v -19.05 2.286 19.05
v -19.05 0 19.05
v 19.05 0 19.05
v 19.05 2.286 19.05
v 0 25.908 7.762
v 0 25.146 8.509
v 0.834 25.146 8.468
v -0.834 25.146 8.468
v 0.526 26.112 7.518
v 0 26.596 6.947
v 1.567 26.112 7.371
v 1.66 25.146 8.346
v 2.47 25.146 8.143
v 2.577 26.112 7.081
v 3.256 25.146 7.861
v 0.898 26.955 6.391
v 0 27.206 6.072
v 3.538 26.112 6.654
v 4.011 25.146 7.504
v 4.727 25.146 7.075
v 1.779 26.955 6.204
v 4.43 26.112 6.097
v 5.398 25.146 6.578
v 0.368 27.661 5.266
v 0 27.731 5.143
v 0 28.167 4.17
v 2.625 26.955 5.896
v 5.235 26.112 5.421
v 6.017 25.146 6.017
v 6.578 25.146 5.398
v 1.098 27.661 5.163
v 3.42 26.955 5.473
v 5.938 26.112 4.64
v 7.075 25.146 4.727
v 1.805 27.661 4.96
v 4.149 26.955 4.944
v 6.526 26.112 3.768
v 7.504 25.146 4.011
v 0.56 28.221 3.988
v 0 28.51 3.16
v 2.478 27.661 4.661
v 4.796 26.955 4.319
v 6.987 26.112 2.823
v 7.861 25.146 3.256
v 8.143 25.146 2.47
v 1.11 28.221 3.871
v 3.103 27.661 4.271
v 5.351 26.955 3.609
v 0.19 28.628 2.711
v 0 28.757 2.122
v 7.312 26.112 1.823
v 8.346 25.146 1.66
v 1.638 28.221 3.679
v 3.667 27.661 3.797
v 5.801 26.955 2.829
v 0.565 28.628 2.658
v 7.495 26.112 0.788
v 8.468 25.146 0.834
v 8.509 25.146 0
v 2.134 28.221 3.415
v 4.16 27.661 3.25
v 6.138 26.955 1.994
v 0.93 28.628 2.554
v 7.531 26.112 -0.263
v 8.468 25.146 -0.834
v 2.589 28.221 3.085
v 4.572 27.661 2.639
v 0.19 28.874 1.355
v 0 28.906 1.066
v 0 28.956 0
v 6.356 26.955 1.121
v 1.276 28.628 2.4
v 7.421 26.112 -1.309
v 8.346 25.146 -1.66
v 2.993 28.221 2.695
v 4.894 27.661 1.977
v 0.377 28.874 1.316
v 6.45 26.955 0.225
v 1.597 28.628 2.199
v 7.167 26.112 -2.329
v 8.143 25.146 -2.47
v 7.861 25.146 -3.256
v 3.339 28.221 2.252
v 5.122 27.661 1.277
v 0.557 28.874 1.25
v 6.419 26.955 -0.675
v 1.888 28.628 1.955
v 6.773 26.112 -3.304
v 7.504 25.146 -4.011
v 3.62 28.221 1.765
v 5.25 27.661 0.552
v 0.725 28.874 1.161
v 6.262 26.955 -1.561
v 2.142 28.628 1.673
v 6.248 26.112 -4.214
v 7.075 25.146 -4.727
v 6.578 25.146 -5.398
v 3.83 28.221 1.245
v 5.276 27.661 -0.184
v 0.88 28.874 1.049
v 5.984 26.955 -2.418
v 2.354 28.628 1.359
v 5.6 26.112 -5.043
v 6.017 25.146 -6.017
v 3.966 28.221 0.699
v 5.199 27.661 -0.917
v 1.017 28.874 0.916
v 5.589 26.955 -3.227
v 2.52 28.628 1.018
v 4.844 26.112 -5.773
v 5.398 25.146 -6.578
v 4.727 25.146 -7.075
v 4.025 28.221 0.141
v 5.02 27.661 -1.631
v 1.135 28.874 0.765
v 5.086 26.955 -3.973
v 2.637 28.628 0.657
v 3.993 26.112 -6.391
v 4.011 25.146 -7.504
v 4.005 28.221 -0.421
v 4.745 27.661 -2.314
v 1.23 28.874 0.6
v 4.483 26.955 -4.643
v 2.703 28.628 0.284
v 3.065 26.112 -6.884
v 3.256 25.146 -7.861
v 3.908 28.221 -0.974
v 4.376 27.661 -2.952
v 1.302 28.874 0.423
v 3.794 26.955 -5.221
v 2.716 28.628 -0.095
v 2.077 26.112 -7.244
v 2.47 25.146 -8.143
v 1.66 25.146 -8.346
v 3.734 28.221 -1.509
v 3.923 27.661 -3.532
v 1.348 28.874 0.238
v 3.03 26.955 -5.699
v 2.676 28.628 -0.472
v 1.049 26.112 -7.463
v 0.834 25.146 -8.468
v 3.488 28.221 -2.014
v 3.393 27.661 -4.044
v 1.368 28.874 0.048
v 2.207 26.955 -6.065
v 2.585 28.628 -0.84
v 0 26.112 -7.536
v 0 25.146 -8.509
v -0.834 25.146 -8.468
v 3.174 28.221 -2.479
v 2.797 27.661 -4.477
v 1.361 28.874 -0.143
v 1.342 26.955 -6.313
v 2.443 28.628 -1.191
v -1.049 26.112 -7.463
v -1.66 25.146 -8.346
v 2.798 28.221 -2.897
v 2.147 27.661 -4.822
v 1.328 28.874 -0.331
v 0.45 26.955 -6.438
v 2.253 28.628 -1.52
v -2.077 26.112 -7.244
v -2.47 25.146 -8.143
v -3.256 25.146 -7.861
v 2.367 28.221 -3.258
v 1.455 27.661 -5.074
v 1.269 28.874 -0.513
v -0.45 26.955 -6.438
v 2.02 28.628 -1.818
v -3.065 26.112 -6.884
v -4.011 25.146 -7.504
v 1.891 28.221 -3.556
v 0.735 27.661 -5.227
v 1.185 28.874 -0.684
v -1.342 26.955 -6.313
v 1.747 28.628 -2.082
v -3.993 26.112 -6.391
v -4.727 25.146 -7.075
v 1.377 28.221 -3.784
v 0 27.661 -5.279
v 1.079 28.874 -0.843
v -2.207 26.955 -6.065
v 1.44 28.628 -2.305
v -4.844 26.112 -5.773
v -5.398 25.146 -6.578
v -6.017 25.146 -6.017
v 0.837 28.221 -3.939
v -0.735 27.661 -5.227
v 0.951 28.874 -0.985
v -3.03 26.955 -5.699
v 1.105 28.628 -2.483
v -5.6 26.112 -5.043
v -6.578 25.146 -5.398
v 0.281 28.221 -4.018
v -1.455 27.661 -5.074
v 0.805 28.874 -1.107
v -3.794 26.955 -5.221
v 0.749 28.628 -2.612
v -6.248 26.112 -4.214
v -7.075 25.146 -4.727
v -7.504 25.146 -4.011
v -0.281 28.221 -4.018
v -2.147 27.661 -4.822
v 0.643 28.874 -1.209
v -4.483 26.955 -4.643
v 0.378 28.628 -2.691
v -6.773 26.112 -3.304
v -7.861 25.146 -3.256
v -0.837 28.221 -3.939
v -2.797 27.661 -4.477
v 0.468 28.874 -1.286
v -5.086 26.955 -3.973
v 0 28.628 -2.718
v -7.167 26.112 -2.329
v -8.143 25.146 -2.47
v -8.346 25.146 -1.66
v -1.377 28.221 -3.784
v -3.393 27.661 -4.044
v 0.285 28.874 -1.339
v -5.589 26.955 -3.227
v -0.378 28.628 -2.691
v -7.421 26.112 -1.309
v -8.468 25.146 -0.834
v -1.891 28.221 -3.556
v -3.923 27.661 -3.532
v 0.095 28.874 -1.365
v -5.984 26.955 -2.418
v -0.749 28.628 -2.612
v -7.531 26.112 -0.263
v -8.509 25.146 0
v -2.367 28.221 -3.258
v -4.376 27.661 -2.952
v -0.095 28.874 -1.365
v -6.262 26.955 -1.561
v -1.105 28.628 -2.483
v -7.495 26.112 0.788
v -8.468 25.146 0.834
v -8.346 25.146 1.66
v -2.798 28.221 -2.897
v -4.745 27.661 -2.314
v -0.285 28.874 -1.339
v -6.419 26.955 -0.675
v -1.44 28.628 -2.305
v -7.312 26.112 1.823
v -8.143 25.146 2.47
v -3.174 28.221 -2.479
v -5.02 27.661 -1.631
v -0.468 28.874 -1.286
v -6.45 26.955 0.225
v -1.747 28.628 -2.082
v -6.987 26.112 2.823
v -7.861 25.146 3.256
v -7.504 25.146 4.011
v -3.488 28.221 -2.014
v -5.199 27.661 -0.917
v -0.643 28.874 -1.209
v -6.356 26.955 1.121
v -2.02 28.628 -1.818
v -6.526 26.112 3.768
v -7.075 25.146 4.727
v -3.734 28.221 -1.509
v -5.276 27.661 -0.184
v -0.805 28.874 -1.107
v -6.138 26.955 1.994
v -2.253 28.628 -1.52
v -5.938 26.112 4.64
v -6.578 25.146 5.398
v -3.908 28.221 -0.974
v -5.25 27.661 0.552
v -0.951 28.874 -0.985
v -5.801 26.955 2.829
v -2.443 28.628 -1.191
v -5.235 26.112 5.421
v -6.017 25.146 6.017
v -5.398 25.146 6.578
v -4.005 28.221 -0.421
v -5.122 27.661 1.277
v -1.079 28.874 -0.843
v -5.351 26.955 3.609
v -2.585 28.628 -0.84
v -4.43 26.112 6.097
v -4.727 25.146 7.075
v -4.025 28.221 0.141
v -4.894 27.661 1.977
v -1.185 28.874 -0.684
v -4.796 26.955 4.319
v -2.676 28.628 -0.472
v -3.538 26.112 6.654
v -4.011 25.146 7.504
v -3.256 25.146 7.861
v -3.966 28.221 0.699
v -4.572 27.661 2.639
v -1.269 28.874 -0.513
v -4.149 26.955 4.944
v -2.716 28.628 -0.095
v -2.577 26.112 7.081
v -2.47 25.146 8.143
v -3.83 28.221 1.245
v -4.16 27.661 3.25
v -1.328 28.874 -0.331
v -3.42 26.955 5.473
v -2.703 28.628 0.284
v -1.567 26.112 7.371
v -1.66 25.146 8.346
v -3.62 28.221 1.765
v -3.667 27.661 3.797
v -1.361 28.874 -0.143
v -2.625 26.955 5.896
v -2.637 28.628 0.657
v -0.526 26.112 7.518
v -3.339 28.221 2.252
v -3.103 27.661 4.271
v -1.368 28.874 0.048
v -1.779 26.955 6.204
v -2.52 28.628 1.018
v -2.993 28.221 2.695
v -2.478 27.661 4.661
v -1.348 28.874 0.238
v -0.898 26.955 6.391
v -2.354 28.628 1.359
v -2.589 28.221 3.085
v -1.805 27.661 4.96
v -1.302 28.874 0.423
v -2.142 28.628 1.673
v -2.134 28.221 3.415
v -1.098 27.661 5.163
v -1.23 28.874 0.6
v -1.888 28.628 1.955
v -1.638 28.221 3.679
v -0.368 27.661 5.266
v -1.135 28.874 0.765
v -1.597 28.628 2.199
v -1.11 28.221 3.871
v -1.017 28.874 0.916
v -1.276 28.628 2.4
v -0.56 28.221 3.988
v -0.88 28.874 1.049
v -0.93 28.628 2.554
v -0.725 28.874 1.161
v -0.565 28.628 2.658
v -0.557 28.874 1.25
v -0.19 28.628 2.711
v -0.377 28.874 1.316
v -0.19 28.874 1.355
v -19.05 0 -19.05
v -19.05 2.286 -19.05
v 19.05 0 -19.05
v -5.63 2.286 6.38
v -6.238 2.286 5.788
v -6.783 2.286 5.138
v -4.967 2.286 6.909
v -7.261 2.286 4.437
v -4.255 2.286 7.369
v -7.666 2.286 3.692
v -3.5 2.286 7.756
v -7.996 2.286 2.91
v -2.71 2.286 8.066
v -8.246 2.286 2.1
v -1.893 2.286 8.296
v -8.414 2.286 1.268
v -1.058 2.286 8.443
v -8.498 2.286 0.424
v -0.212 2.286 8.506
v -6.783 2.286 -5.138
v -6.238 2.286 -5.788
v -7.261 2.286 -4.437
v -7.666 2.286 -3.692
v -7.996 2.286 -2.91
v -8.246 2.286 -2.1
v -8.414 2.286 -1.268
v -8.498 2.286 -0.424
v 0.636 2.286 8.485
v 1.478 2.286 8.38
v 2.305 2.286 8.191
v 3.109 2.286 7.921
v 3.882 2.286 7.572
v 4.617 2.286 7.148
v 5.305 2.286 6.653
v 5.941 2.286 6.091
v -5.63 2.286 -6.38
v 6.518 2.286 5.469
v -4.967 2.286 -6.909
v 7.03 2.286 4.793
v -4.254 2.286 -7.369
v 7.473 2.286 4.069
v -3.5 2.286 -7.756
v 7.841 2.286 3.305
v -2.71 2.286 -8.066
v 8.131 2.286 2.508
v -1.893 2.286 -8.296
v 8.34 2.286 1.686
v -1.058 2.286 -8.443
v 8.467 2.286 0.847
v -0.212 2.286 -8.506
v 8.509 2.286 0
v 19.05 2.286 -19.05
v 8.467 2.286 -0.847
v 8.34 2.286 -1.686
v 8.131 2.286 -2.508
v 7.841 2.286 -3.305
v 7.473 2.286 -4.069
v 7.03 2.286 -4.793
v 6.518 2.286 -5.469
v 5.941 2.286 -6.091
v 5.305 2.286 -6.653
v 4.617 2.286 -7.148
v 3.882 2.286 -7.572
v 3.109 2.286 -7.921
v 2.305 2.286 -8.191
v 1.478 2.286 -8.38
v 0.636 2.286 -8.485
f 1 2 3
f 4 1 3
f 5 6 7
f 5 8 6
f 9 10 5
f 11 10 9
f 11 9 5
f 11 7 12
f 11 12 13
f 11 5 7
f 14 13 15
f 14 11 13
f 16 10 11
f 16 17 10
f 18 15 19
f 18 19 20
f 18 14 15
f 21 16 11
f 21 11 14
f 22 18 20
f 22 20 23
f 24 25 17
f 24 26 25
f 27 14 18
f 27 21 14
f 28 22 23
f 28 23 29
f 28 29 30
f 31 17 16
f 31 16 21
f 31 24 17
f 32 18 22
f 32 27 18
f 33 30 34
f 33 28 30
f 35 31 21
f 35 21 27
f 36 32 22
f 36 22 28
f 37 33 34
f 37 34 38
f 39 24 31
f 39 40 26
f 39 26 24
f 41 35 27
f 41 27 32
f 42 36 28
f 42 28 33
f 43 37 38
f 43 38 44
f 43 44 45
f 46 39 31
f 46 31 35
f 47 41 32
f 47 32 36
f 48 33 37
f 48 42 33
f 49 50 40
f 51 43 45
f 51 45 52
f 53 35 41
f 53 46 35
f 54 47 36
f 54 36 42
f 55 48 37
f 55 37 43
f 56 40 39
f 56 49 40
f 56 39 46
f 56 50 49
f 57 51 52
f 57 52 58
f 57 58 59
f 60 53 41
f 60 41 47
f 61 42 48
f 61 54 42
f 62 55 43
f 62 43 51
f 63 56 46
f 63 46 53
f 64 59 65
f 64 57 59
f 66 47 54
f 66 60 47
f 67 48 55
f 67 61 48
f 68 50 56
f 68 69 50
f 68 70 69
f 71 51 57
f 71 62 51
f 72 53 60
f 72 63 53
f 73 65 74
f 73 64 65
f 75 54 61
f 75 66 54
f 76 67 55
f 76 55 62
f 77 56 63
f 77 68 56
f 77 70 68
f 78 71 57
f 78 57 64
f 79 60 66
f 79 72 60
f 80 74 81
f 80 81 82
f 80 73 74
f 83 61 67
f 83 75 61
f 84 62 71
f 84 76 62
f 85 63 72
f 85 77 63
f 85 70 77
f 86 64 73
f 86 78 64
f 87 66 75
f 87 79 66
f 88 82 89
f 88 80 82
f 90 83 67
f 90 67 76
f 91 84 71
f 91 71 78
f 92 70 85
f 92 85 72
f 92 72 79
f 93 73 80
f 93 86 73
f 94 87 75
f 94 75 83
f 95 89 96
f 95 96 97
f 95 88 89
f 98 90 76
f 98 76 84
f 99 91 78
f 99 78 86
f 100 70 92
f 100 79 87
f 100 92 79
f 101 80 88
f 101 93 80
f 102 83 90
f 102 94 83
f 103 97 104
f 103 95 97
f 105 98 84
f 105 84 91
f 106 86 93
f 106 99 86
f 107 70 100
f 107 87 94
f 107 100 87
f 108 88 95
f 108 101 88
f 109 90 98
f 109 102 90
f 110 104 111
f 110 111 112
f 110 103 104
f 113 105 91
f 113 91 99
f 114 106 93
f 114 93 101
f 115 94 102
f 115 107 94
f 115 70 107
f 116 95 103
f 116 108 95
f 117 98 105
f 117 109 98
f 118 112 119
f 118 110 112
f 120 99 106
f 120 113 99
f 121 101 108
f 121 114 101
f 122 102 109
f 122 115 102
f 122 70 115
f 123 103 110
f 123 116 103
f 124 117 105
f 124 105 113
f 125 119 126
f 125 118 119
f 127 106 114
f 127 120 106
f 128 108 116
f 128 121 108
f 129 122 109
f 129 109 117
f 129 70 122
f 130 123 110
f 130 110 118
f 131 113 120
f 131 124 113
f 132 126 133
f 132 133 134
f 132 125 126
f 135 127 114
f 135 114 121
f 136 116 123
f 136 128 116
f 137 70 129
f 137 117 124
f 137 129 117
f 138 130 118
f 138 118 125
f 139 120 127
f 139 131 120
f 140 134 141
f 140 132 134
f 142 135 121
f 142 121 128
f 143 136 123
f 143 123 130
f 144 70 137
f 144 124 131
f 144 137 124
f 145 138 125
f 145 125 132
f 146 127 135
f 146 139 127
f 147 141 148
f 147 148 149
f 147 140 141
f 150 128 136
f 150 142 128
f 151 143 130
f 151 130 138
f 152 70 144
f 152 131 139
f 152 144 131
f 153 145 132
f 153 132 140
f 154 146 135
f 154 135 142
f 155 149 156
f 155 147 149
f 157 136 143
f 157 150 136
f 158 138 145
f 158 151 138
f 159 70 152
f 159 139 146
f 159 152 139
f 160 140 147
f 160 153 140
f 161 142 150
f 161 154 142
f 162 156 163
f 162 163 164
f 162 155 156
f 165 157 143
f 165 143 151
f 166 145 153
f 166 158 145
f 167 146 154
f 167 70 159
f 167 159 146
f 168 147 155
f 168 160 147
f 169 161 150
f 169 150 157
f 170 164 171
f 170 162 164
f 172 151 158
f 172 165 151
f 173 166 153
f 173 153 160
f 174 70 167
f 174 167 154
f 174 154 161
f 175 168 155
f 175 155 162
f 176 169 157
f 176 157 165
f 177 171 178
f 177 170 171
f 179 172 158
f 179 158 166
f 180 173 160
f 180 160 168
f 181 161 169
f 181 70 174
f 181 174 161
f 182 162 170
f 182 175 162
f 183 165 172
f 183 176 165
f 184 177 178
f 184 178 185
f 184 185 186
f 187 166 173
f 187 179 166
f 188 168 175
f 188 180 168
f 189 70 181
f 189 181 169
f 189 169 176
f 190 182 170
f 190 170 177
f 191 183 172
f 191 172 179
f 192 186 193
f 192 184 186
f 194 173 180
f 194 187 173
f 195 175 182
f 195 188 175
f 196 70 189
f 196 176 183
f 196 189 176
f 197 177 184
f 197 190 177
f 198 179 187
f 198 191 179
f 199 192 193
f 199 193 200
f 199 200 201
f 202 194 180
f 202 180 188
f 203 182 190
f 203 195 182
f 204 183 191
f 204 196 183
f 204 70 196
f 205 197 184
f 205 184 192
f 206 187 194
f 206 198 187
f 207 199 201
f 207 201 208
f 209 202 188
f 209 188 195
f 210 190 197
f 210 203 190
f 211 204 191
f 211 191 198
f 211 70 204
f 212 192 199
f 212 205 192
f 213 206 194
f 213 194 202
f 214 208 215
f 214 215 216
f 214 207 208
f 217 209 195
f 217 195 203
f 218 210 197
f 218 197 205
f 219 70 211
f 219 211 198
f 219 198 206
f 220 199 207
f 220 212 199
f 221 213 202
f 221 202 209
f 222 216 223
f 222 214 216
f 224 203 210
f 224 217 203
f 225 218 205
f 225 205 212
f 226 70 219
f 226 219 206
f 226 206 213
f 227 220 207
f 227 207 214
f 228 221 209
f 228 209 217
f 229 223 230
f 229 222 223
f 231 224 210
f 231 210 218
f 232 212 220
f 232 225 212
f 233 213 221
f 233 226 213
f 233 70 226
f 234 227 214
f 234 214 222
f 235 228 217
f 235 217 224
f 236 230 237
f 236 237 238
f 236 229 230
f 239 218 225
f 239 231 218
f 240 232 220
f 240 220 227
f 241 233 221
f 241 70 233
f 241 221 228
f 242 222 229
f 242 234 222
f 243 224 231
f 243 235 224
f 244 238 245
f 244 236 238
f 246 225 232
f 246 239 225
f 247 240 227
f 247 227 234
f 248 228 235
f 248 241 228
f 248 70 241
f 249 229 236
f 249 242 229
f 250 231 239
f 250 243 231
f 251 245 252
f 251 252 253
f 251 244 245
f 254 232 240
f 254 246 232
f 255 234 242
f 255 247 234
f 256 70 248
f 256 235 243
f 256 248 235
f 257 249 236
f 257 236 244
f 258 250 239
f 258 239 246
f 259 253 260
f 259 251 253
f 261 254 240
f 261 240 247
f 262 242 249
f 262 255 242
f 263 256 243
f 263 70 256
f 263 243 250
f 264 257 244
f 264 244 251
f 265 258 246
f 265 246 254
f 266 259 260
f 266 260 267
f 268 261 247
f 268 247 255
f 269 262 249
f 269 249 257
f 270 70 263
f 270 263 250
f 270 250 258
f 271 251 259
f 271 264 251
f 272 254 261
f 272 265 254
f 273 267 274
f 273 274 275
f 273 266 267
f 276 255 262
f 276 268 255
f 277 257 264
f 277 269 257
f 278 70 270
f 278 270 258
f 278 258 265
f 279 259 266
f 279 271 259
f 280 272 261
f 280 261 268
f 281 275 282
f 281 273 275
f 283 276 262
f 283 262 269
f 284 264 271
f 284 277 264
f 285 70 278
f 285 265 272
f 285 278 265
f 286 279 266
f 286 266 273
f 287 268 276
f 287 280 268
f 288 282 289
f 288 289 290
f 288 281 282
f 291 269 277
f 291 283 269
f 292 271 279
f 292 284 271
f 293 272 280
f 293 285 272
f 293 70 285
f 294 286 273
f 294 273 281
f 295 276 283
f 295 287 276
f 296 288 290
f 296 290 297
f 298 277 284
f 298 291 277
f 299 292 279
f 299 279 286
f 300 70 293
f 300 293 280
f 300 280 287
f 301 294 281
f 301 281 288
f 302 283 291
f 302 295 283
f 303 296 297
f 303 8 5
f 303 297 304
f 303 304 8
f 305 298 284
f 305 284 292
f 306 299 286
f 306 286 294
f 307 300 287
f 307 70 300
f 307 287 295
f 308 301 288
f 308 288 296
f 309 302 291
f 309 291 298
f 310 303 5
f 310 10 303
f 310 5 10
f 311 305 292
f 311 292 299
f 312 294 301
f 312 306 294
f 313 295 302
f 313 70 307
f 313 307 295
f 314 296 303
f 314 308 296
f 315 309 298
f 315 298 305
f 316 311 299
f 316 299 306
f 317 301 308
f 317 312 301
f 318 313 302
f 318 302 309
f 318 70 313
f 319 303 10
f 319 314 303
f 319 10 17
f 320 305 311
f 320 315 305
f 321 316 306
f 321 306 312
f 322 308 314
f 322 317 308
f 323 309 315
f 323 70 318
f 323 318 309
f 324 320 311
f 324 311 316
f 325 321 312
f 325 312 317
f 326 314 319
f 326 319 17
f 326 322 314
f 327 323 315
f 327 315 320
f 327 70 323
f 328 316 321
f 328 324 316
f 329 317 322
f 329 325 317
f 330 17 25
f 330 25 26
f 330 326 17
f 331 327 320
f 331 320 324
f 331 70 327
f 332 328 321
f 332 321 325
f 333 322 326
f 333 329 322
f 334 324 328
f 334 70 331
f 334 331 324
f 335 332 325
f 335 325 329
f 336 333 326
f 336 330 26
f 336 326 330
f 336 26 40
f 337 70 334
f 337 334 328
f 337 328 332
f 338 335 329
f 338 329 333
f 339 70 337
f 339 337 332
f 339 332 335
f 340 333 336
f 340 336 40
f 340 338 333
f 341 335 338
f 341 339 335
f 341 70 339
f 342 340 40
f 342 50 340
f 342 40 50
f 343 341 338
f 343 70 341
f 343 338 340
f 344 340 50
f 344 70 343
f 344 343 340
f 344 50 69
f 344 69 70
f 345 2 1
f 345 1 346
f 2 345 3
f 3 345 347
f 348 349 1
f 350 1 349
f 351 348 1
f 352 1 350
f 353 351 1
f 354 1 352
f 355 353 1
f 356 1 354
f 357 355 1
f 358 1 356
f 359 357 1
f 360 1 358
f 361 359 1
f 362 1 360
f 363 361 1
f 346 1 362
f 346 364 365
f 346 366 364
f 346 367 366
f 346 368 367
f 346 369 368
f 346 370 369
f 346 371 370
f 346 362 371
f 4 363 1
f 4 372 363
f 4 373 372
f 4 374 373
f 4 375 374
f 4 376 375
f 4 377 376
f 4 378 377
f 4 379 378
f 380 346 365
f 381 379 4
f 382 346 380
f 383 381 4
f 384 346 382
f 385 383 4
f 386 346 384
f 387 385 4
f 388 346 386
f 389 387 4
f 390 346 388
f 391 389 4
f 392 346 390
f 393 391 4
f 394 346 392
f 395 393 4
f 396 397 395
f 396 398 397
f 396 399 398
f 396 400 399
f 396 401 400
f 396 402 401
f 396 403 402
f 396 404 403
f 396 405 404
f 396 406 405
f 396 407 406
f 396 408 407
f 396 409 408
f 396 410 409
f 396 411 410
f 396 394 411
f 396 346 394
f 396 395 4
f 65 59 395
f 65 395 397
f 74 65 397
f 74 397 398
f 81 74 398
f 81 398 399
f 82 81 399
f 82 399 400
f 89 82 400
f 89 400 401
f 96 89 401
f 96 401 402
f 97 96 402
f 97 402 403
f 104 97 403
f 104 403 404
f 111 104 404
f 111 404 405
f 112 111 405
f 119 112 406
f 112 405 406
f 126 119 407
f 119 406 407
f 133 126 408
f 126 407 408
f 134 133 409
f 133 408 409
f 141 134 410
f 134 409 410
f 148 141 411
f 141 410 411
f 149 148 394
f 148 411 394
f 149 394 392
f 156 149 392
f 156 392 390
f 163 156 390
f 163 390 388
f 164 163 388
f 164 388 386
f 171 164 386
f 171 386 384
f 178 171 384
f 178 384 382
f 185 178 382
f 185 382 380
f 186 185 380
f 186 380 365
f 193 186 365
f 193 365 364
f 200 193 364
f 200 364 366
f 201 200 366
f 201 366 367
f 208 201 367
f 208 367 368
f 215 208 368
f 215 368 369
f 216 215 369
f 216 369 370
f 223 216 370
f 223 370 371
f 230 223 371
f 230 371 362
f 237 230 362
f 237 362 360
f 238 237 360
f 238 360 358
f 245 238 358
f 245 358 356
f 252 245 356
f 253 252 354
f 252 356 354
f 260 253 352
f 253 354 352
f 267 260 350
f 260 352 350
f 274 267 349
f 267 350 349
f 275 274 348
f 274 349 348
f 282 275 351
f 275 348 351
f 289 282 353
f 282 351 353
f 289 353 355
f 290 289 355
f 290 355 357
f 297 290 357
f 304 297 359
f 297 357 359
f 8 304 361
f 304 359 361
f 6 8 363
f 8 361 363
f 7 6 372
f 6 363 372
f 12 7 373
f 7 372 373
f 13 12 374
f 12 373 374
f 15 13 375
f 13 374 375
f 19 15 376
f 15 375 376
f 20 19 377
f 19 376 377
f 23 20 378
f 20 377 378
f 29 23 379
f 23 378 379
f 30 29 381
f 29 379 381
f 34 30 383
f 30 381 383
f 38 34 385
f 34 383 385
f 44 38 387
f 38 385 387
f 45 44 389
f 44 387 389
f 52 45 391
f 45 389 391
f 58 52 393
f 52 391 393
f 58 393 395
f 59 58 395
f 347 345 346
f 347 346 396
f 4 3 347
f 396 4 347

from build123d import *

# Parameters (mm, degrees)
SKETCH3_W           = 38.1
SKETCH3_H           = 38.1
BOSS_EXTRUDE1_DEPTH = 2.286
SKETCH4_R           = 8.509
BOSS_EXTRUDE2_DEPTH = 22.86
DOME2_FACE_RADIUS   = 8.509
DOME2_HEIGHT        = 3.81


with BuildPart() as part:
    # Sketch3 → Boss-Extrude1 (new body)
    with BuildSketch(Plane(origin=(0, 0, 0), x_dir=(1, 0, 0), z_dir=(0, 1, 0))):
        Rectangle(SKETCH3_W, SKETCH3_H)
    extrude(amount=BOSS_EXTRUDE1_DEPTH)

    # Sketch4 → Boss-Extrude2 (add)
    with BuildSketch(Plane(origin=(0, 2.286, 0), x_dir=(1, 0, 0), z_dir=(0, 1, 0))):
        Circle(SKETCH4_R)
    extrude(amount=BOSS_EXTRUDE2_DEPTH)

    # Dome2: a dome of height H over a round flat face of radius A is a cap of a sphere of radius (A * A + H * H) / (2 * H)
    dome2_r = (DOME2_FACE_RADIUS * DOME2_FACE_RADIUS + DOME2_HEIGHT * DOME2_HEIGHT) / (2 * DOME2_HEIGHT)
    dome2_base = Plane((0, 25.146, 0), z_dir=(0, 1, 0))
    with Locations(dome2_base.offset(DOME2_HEIGHT - dome2_r)):
        dome2_ball = Sphere(dome2_r, mode=Mode.PRIVATE)
    add(split(dome2_ball, bisect_by=dome2_base, keep=Keep.TOP, mode=Mode.PRIVATE))


solid = part.part
